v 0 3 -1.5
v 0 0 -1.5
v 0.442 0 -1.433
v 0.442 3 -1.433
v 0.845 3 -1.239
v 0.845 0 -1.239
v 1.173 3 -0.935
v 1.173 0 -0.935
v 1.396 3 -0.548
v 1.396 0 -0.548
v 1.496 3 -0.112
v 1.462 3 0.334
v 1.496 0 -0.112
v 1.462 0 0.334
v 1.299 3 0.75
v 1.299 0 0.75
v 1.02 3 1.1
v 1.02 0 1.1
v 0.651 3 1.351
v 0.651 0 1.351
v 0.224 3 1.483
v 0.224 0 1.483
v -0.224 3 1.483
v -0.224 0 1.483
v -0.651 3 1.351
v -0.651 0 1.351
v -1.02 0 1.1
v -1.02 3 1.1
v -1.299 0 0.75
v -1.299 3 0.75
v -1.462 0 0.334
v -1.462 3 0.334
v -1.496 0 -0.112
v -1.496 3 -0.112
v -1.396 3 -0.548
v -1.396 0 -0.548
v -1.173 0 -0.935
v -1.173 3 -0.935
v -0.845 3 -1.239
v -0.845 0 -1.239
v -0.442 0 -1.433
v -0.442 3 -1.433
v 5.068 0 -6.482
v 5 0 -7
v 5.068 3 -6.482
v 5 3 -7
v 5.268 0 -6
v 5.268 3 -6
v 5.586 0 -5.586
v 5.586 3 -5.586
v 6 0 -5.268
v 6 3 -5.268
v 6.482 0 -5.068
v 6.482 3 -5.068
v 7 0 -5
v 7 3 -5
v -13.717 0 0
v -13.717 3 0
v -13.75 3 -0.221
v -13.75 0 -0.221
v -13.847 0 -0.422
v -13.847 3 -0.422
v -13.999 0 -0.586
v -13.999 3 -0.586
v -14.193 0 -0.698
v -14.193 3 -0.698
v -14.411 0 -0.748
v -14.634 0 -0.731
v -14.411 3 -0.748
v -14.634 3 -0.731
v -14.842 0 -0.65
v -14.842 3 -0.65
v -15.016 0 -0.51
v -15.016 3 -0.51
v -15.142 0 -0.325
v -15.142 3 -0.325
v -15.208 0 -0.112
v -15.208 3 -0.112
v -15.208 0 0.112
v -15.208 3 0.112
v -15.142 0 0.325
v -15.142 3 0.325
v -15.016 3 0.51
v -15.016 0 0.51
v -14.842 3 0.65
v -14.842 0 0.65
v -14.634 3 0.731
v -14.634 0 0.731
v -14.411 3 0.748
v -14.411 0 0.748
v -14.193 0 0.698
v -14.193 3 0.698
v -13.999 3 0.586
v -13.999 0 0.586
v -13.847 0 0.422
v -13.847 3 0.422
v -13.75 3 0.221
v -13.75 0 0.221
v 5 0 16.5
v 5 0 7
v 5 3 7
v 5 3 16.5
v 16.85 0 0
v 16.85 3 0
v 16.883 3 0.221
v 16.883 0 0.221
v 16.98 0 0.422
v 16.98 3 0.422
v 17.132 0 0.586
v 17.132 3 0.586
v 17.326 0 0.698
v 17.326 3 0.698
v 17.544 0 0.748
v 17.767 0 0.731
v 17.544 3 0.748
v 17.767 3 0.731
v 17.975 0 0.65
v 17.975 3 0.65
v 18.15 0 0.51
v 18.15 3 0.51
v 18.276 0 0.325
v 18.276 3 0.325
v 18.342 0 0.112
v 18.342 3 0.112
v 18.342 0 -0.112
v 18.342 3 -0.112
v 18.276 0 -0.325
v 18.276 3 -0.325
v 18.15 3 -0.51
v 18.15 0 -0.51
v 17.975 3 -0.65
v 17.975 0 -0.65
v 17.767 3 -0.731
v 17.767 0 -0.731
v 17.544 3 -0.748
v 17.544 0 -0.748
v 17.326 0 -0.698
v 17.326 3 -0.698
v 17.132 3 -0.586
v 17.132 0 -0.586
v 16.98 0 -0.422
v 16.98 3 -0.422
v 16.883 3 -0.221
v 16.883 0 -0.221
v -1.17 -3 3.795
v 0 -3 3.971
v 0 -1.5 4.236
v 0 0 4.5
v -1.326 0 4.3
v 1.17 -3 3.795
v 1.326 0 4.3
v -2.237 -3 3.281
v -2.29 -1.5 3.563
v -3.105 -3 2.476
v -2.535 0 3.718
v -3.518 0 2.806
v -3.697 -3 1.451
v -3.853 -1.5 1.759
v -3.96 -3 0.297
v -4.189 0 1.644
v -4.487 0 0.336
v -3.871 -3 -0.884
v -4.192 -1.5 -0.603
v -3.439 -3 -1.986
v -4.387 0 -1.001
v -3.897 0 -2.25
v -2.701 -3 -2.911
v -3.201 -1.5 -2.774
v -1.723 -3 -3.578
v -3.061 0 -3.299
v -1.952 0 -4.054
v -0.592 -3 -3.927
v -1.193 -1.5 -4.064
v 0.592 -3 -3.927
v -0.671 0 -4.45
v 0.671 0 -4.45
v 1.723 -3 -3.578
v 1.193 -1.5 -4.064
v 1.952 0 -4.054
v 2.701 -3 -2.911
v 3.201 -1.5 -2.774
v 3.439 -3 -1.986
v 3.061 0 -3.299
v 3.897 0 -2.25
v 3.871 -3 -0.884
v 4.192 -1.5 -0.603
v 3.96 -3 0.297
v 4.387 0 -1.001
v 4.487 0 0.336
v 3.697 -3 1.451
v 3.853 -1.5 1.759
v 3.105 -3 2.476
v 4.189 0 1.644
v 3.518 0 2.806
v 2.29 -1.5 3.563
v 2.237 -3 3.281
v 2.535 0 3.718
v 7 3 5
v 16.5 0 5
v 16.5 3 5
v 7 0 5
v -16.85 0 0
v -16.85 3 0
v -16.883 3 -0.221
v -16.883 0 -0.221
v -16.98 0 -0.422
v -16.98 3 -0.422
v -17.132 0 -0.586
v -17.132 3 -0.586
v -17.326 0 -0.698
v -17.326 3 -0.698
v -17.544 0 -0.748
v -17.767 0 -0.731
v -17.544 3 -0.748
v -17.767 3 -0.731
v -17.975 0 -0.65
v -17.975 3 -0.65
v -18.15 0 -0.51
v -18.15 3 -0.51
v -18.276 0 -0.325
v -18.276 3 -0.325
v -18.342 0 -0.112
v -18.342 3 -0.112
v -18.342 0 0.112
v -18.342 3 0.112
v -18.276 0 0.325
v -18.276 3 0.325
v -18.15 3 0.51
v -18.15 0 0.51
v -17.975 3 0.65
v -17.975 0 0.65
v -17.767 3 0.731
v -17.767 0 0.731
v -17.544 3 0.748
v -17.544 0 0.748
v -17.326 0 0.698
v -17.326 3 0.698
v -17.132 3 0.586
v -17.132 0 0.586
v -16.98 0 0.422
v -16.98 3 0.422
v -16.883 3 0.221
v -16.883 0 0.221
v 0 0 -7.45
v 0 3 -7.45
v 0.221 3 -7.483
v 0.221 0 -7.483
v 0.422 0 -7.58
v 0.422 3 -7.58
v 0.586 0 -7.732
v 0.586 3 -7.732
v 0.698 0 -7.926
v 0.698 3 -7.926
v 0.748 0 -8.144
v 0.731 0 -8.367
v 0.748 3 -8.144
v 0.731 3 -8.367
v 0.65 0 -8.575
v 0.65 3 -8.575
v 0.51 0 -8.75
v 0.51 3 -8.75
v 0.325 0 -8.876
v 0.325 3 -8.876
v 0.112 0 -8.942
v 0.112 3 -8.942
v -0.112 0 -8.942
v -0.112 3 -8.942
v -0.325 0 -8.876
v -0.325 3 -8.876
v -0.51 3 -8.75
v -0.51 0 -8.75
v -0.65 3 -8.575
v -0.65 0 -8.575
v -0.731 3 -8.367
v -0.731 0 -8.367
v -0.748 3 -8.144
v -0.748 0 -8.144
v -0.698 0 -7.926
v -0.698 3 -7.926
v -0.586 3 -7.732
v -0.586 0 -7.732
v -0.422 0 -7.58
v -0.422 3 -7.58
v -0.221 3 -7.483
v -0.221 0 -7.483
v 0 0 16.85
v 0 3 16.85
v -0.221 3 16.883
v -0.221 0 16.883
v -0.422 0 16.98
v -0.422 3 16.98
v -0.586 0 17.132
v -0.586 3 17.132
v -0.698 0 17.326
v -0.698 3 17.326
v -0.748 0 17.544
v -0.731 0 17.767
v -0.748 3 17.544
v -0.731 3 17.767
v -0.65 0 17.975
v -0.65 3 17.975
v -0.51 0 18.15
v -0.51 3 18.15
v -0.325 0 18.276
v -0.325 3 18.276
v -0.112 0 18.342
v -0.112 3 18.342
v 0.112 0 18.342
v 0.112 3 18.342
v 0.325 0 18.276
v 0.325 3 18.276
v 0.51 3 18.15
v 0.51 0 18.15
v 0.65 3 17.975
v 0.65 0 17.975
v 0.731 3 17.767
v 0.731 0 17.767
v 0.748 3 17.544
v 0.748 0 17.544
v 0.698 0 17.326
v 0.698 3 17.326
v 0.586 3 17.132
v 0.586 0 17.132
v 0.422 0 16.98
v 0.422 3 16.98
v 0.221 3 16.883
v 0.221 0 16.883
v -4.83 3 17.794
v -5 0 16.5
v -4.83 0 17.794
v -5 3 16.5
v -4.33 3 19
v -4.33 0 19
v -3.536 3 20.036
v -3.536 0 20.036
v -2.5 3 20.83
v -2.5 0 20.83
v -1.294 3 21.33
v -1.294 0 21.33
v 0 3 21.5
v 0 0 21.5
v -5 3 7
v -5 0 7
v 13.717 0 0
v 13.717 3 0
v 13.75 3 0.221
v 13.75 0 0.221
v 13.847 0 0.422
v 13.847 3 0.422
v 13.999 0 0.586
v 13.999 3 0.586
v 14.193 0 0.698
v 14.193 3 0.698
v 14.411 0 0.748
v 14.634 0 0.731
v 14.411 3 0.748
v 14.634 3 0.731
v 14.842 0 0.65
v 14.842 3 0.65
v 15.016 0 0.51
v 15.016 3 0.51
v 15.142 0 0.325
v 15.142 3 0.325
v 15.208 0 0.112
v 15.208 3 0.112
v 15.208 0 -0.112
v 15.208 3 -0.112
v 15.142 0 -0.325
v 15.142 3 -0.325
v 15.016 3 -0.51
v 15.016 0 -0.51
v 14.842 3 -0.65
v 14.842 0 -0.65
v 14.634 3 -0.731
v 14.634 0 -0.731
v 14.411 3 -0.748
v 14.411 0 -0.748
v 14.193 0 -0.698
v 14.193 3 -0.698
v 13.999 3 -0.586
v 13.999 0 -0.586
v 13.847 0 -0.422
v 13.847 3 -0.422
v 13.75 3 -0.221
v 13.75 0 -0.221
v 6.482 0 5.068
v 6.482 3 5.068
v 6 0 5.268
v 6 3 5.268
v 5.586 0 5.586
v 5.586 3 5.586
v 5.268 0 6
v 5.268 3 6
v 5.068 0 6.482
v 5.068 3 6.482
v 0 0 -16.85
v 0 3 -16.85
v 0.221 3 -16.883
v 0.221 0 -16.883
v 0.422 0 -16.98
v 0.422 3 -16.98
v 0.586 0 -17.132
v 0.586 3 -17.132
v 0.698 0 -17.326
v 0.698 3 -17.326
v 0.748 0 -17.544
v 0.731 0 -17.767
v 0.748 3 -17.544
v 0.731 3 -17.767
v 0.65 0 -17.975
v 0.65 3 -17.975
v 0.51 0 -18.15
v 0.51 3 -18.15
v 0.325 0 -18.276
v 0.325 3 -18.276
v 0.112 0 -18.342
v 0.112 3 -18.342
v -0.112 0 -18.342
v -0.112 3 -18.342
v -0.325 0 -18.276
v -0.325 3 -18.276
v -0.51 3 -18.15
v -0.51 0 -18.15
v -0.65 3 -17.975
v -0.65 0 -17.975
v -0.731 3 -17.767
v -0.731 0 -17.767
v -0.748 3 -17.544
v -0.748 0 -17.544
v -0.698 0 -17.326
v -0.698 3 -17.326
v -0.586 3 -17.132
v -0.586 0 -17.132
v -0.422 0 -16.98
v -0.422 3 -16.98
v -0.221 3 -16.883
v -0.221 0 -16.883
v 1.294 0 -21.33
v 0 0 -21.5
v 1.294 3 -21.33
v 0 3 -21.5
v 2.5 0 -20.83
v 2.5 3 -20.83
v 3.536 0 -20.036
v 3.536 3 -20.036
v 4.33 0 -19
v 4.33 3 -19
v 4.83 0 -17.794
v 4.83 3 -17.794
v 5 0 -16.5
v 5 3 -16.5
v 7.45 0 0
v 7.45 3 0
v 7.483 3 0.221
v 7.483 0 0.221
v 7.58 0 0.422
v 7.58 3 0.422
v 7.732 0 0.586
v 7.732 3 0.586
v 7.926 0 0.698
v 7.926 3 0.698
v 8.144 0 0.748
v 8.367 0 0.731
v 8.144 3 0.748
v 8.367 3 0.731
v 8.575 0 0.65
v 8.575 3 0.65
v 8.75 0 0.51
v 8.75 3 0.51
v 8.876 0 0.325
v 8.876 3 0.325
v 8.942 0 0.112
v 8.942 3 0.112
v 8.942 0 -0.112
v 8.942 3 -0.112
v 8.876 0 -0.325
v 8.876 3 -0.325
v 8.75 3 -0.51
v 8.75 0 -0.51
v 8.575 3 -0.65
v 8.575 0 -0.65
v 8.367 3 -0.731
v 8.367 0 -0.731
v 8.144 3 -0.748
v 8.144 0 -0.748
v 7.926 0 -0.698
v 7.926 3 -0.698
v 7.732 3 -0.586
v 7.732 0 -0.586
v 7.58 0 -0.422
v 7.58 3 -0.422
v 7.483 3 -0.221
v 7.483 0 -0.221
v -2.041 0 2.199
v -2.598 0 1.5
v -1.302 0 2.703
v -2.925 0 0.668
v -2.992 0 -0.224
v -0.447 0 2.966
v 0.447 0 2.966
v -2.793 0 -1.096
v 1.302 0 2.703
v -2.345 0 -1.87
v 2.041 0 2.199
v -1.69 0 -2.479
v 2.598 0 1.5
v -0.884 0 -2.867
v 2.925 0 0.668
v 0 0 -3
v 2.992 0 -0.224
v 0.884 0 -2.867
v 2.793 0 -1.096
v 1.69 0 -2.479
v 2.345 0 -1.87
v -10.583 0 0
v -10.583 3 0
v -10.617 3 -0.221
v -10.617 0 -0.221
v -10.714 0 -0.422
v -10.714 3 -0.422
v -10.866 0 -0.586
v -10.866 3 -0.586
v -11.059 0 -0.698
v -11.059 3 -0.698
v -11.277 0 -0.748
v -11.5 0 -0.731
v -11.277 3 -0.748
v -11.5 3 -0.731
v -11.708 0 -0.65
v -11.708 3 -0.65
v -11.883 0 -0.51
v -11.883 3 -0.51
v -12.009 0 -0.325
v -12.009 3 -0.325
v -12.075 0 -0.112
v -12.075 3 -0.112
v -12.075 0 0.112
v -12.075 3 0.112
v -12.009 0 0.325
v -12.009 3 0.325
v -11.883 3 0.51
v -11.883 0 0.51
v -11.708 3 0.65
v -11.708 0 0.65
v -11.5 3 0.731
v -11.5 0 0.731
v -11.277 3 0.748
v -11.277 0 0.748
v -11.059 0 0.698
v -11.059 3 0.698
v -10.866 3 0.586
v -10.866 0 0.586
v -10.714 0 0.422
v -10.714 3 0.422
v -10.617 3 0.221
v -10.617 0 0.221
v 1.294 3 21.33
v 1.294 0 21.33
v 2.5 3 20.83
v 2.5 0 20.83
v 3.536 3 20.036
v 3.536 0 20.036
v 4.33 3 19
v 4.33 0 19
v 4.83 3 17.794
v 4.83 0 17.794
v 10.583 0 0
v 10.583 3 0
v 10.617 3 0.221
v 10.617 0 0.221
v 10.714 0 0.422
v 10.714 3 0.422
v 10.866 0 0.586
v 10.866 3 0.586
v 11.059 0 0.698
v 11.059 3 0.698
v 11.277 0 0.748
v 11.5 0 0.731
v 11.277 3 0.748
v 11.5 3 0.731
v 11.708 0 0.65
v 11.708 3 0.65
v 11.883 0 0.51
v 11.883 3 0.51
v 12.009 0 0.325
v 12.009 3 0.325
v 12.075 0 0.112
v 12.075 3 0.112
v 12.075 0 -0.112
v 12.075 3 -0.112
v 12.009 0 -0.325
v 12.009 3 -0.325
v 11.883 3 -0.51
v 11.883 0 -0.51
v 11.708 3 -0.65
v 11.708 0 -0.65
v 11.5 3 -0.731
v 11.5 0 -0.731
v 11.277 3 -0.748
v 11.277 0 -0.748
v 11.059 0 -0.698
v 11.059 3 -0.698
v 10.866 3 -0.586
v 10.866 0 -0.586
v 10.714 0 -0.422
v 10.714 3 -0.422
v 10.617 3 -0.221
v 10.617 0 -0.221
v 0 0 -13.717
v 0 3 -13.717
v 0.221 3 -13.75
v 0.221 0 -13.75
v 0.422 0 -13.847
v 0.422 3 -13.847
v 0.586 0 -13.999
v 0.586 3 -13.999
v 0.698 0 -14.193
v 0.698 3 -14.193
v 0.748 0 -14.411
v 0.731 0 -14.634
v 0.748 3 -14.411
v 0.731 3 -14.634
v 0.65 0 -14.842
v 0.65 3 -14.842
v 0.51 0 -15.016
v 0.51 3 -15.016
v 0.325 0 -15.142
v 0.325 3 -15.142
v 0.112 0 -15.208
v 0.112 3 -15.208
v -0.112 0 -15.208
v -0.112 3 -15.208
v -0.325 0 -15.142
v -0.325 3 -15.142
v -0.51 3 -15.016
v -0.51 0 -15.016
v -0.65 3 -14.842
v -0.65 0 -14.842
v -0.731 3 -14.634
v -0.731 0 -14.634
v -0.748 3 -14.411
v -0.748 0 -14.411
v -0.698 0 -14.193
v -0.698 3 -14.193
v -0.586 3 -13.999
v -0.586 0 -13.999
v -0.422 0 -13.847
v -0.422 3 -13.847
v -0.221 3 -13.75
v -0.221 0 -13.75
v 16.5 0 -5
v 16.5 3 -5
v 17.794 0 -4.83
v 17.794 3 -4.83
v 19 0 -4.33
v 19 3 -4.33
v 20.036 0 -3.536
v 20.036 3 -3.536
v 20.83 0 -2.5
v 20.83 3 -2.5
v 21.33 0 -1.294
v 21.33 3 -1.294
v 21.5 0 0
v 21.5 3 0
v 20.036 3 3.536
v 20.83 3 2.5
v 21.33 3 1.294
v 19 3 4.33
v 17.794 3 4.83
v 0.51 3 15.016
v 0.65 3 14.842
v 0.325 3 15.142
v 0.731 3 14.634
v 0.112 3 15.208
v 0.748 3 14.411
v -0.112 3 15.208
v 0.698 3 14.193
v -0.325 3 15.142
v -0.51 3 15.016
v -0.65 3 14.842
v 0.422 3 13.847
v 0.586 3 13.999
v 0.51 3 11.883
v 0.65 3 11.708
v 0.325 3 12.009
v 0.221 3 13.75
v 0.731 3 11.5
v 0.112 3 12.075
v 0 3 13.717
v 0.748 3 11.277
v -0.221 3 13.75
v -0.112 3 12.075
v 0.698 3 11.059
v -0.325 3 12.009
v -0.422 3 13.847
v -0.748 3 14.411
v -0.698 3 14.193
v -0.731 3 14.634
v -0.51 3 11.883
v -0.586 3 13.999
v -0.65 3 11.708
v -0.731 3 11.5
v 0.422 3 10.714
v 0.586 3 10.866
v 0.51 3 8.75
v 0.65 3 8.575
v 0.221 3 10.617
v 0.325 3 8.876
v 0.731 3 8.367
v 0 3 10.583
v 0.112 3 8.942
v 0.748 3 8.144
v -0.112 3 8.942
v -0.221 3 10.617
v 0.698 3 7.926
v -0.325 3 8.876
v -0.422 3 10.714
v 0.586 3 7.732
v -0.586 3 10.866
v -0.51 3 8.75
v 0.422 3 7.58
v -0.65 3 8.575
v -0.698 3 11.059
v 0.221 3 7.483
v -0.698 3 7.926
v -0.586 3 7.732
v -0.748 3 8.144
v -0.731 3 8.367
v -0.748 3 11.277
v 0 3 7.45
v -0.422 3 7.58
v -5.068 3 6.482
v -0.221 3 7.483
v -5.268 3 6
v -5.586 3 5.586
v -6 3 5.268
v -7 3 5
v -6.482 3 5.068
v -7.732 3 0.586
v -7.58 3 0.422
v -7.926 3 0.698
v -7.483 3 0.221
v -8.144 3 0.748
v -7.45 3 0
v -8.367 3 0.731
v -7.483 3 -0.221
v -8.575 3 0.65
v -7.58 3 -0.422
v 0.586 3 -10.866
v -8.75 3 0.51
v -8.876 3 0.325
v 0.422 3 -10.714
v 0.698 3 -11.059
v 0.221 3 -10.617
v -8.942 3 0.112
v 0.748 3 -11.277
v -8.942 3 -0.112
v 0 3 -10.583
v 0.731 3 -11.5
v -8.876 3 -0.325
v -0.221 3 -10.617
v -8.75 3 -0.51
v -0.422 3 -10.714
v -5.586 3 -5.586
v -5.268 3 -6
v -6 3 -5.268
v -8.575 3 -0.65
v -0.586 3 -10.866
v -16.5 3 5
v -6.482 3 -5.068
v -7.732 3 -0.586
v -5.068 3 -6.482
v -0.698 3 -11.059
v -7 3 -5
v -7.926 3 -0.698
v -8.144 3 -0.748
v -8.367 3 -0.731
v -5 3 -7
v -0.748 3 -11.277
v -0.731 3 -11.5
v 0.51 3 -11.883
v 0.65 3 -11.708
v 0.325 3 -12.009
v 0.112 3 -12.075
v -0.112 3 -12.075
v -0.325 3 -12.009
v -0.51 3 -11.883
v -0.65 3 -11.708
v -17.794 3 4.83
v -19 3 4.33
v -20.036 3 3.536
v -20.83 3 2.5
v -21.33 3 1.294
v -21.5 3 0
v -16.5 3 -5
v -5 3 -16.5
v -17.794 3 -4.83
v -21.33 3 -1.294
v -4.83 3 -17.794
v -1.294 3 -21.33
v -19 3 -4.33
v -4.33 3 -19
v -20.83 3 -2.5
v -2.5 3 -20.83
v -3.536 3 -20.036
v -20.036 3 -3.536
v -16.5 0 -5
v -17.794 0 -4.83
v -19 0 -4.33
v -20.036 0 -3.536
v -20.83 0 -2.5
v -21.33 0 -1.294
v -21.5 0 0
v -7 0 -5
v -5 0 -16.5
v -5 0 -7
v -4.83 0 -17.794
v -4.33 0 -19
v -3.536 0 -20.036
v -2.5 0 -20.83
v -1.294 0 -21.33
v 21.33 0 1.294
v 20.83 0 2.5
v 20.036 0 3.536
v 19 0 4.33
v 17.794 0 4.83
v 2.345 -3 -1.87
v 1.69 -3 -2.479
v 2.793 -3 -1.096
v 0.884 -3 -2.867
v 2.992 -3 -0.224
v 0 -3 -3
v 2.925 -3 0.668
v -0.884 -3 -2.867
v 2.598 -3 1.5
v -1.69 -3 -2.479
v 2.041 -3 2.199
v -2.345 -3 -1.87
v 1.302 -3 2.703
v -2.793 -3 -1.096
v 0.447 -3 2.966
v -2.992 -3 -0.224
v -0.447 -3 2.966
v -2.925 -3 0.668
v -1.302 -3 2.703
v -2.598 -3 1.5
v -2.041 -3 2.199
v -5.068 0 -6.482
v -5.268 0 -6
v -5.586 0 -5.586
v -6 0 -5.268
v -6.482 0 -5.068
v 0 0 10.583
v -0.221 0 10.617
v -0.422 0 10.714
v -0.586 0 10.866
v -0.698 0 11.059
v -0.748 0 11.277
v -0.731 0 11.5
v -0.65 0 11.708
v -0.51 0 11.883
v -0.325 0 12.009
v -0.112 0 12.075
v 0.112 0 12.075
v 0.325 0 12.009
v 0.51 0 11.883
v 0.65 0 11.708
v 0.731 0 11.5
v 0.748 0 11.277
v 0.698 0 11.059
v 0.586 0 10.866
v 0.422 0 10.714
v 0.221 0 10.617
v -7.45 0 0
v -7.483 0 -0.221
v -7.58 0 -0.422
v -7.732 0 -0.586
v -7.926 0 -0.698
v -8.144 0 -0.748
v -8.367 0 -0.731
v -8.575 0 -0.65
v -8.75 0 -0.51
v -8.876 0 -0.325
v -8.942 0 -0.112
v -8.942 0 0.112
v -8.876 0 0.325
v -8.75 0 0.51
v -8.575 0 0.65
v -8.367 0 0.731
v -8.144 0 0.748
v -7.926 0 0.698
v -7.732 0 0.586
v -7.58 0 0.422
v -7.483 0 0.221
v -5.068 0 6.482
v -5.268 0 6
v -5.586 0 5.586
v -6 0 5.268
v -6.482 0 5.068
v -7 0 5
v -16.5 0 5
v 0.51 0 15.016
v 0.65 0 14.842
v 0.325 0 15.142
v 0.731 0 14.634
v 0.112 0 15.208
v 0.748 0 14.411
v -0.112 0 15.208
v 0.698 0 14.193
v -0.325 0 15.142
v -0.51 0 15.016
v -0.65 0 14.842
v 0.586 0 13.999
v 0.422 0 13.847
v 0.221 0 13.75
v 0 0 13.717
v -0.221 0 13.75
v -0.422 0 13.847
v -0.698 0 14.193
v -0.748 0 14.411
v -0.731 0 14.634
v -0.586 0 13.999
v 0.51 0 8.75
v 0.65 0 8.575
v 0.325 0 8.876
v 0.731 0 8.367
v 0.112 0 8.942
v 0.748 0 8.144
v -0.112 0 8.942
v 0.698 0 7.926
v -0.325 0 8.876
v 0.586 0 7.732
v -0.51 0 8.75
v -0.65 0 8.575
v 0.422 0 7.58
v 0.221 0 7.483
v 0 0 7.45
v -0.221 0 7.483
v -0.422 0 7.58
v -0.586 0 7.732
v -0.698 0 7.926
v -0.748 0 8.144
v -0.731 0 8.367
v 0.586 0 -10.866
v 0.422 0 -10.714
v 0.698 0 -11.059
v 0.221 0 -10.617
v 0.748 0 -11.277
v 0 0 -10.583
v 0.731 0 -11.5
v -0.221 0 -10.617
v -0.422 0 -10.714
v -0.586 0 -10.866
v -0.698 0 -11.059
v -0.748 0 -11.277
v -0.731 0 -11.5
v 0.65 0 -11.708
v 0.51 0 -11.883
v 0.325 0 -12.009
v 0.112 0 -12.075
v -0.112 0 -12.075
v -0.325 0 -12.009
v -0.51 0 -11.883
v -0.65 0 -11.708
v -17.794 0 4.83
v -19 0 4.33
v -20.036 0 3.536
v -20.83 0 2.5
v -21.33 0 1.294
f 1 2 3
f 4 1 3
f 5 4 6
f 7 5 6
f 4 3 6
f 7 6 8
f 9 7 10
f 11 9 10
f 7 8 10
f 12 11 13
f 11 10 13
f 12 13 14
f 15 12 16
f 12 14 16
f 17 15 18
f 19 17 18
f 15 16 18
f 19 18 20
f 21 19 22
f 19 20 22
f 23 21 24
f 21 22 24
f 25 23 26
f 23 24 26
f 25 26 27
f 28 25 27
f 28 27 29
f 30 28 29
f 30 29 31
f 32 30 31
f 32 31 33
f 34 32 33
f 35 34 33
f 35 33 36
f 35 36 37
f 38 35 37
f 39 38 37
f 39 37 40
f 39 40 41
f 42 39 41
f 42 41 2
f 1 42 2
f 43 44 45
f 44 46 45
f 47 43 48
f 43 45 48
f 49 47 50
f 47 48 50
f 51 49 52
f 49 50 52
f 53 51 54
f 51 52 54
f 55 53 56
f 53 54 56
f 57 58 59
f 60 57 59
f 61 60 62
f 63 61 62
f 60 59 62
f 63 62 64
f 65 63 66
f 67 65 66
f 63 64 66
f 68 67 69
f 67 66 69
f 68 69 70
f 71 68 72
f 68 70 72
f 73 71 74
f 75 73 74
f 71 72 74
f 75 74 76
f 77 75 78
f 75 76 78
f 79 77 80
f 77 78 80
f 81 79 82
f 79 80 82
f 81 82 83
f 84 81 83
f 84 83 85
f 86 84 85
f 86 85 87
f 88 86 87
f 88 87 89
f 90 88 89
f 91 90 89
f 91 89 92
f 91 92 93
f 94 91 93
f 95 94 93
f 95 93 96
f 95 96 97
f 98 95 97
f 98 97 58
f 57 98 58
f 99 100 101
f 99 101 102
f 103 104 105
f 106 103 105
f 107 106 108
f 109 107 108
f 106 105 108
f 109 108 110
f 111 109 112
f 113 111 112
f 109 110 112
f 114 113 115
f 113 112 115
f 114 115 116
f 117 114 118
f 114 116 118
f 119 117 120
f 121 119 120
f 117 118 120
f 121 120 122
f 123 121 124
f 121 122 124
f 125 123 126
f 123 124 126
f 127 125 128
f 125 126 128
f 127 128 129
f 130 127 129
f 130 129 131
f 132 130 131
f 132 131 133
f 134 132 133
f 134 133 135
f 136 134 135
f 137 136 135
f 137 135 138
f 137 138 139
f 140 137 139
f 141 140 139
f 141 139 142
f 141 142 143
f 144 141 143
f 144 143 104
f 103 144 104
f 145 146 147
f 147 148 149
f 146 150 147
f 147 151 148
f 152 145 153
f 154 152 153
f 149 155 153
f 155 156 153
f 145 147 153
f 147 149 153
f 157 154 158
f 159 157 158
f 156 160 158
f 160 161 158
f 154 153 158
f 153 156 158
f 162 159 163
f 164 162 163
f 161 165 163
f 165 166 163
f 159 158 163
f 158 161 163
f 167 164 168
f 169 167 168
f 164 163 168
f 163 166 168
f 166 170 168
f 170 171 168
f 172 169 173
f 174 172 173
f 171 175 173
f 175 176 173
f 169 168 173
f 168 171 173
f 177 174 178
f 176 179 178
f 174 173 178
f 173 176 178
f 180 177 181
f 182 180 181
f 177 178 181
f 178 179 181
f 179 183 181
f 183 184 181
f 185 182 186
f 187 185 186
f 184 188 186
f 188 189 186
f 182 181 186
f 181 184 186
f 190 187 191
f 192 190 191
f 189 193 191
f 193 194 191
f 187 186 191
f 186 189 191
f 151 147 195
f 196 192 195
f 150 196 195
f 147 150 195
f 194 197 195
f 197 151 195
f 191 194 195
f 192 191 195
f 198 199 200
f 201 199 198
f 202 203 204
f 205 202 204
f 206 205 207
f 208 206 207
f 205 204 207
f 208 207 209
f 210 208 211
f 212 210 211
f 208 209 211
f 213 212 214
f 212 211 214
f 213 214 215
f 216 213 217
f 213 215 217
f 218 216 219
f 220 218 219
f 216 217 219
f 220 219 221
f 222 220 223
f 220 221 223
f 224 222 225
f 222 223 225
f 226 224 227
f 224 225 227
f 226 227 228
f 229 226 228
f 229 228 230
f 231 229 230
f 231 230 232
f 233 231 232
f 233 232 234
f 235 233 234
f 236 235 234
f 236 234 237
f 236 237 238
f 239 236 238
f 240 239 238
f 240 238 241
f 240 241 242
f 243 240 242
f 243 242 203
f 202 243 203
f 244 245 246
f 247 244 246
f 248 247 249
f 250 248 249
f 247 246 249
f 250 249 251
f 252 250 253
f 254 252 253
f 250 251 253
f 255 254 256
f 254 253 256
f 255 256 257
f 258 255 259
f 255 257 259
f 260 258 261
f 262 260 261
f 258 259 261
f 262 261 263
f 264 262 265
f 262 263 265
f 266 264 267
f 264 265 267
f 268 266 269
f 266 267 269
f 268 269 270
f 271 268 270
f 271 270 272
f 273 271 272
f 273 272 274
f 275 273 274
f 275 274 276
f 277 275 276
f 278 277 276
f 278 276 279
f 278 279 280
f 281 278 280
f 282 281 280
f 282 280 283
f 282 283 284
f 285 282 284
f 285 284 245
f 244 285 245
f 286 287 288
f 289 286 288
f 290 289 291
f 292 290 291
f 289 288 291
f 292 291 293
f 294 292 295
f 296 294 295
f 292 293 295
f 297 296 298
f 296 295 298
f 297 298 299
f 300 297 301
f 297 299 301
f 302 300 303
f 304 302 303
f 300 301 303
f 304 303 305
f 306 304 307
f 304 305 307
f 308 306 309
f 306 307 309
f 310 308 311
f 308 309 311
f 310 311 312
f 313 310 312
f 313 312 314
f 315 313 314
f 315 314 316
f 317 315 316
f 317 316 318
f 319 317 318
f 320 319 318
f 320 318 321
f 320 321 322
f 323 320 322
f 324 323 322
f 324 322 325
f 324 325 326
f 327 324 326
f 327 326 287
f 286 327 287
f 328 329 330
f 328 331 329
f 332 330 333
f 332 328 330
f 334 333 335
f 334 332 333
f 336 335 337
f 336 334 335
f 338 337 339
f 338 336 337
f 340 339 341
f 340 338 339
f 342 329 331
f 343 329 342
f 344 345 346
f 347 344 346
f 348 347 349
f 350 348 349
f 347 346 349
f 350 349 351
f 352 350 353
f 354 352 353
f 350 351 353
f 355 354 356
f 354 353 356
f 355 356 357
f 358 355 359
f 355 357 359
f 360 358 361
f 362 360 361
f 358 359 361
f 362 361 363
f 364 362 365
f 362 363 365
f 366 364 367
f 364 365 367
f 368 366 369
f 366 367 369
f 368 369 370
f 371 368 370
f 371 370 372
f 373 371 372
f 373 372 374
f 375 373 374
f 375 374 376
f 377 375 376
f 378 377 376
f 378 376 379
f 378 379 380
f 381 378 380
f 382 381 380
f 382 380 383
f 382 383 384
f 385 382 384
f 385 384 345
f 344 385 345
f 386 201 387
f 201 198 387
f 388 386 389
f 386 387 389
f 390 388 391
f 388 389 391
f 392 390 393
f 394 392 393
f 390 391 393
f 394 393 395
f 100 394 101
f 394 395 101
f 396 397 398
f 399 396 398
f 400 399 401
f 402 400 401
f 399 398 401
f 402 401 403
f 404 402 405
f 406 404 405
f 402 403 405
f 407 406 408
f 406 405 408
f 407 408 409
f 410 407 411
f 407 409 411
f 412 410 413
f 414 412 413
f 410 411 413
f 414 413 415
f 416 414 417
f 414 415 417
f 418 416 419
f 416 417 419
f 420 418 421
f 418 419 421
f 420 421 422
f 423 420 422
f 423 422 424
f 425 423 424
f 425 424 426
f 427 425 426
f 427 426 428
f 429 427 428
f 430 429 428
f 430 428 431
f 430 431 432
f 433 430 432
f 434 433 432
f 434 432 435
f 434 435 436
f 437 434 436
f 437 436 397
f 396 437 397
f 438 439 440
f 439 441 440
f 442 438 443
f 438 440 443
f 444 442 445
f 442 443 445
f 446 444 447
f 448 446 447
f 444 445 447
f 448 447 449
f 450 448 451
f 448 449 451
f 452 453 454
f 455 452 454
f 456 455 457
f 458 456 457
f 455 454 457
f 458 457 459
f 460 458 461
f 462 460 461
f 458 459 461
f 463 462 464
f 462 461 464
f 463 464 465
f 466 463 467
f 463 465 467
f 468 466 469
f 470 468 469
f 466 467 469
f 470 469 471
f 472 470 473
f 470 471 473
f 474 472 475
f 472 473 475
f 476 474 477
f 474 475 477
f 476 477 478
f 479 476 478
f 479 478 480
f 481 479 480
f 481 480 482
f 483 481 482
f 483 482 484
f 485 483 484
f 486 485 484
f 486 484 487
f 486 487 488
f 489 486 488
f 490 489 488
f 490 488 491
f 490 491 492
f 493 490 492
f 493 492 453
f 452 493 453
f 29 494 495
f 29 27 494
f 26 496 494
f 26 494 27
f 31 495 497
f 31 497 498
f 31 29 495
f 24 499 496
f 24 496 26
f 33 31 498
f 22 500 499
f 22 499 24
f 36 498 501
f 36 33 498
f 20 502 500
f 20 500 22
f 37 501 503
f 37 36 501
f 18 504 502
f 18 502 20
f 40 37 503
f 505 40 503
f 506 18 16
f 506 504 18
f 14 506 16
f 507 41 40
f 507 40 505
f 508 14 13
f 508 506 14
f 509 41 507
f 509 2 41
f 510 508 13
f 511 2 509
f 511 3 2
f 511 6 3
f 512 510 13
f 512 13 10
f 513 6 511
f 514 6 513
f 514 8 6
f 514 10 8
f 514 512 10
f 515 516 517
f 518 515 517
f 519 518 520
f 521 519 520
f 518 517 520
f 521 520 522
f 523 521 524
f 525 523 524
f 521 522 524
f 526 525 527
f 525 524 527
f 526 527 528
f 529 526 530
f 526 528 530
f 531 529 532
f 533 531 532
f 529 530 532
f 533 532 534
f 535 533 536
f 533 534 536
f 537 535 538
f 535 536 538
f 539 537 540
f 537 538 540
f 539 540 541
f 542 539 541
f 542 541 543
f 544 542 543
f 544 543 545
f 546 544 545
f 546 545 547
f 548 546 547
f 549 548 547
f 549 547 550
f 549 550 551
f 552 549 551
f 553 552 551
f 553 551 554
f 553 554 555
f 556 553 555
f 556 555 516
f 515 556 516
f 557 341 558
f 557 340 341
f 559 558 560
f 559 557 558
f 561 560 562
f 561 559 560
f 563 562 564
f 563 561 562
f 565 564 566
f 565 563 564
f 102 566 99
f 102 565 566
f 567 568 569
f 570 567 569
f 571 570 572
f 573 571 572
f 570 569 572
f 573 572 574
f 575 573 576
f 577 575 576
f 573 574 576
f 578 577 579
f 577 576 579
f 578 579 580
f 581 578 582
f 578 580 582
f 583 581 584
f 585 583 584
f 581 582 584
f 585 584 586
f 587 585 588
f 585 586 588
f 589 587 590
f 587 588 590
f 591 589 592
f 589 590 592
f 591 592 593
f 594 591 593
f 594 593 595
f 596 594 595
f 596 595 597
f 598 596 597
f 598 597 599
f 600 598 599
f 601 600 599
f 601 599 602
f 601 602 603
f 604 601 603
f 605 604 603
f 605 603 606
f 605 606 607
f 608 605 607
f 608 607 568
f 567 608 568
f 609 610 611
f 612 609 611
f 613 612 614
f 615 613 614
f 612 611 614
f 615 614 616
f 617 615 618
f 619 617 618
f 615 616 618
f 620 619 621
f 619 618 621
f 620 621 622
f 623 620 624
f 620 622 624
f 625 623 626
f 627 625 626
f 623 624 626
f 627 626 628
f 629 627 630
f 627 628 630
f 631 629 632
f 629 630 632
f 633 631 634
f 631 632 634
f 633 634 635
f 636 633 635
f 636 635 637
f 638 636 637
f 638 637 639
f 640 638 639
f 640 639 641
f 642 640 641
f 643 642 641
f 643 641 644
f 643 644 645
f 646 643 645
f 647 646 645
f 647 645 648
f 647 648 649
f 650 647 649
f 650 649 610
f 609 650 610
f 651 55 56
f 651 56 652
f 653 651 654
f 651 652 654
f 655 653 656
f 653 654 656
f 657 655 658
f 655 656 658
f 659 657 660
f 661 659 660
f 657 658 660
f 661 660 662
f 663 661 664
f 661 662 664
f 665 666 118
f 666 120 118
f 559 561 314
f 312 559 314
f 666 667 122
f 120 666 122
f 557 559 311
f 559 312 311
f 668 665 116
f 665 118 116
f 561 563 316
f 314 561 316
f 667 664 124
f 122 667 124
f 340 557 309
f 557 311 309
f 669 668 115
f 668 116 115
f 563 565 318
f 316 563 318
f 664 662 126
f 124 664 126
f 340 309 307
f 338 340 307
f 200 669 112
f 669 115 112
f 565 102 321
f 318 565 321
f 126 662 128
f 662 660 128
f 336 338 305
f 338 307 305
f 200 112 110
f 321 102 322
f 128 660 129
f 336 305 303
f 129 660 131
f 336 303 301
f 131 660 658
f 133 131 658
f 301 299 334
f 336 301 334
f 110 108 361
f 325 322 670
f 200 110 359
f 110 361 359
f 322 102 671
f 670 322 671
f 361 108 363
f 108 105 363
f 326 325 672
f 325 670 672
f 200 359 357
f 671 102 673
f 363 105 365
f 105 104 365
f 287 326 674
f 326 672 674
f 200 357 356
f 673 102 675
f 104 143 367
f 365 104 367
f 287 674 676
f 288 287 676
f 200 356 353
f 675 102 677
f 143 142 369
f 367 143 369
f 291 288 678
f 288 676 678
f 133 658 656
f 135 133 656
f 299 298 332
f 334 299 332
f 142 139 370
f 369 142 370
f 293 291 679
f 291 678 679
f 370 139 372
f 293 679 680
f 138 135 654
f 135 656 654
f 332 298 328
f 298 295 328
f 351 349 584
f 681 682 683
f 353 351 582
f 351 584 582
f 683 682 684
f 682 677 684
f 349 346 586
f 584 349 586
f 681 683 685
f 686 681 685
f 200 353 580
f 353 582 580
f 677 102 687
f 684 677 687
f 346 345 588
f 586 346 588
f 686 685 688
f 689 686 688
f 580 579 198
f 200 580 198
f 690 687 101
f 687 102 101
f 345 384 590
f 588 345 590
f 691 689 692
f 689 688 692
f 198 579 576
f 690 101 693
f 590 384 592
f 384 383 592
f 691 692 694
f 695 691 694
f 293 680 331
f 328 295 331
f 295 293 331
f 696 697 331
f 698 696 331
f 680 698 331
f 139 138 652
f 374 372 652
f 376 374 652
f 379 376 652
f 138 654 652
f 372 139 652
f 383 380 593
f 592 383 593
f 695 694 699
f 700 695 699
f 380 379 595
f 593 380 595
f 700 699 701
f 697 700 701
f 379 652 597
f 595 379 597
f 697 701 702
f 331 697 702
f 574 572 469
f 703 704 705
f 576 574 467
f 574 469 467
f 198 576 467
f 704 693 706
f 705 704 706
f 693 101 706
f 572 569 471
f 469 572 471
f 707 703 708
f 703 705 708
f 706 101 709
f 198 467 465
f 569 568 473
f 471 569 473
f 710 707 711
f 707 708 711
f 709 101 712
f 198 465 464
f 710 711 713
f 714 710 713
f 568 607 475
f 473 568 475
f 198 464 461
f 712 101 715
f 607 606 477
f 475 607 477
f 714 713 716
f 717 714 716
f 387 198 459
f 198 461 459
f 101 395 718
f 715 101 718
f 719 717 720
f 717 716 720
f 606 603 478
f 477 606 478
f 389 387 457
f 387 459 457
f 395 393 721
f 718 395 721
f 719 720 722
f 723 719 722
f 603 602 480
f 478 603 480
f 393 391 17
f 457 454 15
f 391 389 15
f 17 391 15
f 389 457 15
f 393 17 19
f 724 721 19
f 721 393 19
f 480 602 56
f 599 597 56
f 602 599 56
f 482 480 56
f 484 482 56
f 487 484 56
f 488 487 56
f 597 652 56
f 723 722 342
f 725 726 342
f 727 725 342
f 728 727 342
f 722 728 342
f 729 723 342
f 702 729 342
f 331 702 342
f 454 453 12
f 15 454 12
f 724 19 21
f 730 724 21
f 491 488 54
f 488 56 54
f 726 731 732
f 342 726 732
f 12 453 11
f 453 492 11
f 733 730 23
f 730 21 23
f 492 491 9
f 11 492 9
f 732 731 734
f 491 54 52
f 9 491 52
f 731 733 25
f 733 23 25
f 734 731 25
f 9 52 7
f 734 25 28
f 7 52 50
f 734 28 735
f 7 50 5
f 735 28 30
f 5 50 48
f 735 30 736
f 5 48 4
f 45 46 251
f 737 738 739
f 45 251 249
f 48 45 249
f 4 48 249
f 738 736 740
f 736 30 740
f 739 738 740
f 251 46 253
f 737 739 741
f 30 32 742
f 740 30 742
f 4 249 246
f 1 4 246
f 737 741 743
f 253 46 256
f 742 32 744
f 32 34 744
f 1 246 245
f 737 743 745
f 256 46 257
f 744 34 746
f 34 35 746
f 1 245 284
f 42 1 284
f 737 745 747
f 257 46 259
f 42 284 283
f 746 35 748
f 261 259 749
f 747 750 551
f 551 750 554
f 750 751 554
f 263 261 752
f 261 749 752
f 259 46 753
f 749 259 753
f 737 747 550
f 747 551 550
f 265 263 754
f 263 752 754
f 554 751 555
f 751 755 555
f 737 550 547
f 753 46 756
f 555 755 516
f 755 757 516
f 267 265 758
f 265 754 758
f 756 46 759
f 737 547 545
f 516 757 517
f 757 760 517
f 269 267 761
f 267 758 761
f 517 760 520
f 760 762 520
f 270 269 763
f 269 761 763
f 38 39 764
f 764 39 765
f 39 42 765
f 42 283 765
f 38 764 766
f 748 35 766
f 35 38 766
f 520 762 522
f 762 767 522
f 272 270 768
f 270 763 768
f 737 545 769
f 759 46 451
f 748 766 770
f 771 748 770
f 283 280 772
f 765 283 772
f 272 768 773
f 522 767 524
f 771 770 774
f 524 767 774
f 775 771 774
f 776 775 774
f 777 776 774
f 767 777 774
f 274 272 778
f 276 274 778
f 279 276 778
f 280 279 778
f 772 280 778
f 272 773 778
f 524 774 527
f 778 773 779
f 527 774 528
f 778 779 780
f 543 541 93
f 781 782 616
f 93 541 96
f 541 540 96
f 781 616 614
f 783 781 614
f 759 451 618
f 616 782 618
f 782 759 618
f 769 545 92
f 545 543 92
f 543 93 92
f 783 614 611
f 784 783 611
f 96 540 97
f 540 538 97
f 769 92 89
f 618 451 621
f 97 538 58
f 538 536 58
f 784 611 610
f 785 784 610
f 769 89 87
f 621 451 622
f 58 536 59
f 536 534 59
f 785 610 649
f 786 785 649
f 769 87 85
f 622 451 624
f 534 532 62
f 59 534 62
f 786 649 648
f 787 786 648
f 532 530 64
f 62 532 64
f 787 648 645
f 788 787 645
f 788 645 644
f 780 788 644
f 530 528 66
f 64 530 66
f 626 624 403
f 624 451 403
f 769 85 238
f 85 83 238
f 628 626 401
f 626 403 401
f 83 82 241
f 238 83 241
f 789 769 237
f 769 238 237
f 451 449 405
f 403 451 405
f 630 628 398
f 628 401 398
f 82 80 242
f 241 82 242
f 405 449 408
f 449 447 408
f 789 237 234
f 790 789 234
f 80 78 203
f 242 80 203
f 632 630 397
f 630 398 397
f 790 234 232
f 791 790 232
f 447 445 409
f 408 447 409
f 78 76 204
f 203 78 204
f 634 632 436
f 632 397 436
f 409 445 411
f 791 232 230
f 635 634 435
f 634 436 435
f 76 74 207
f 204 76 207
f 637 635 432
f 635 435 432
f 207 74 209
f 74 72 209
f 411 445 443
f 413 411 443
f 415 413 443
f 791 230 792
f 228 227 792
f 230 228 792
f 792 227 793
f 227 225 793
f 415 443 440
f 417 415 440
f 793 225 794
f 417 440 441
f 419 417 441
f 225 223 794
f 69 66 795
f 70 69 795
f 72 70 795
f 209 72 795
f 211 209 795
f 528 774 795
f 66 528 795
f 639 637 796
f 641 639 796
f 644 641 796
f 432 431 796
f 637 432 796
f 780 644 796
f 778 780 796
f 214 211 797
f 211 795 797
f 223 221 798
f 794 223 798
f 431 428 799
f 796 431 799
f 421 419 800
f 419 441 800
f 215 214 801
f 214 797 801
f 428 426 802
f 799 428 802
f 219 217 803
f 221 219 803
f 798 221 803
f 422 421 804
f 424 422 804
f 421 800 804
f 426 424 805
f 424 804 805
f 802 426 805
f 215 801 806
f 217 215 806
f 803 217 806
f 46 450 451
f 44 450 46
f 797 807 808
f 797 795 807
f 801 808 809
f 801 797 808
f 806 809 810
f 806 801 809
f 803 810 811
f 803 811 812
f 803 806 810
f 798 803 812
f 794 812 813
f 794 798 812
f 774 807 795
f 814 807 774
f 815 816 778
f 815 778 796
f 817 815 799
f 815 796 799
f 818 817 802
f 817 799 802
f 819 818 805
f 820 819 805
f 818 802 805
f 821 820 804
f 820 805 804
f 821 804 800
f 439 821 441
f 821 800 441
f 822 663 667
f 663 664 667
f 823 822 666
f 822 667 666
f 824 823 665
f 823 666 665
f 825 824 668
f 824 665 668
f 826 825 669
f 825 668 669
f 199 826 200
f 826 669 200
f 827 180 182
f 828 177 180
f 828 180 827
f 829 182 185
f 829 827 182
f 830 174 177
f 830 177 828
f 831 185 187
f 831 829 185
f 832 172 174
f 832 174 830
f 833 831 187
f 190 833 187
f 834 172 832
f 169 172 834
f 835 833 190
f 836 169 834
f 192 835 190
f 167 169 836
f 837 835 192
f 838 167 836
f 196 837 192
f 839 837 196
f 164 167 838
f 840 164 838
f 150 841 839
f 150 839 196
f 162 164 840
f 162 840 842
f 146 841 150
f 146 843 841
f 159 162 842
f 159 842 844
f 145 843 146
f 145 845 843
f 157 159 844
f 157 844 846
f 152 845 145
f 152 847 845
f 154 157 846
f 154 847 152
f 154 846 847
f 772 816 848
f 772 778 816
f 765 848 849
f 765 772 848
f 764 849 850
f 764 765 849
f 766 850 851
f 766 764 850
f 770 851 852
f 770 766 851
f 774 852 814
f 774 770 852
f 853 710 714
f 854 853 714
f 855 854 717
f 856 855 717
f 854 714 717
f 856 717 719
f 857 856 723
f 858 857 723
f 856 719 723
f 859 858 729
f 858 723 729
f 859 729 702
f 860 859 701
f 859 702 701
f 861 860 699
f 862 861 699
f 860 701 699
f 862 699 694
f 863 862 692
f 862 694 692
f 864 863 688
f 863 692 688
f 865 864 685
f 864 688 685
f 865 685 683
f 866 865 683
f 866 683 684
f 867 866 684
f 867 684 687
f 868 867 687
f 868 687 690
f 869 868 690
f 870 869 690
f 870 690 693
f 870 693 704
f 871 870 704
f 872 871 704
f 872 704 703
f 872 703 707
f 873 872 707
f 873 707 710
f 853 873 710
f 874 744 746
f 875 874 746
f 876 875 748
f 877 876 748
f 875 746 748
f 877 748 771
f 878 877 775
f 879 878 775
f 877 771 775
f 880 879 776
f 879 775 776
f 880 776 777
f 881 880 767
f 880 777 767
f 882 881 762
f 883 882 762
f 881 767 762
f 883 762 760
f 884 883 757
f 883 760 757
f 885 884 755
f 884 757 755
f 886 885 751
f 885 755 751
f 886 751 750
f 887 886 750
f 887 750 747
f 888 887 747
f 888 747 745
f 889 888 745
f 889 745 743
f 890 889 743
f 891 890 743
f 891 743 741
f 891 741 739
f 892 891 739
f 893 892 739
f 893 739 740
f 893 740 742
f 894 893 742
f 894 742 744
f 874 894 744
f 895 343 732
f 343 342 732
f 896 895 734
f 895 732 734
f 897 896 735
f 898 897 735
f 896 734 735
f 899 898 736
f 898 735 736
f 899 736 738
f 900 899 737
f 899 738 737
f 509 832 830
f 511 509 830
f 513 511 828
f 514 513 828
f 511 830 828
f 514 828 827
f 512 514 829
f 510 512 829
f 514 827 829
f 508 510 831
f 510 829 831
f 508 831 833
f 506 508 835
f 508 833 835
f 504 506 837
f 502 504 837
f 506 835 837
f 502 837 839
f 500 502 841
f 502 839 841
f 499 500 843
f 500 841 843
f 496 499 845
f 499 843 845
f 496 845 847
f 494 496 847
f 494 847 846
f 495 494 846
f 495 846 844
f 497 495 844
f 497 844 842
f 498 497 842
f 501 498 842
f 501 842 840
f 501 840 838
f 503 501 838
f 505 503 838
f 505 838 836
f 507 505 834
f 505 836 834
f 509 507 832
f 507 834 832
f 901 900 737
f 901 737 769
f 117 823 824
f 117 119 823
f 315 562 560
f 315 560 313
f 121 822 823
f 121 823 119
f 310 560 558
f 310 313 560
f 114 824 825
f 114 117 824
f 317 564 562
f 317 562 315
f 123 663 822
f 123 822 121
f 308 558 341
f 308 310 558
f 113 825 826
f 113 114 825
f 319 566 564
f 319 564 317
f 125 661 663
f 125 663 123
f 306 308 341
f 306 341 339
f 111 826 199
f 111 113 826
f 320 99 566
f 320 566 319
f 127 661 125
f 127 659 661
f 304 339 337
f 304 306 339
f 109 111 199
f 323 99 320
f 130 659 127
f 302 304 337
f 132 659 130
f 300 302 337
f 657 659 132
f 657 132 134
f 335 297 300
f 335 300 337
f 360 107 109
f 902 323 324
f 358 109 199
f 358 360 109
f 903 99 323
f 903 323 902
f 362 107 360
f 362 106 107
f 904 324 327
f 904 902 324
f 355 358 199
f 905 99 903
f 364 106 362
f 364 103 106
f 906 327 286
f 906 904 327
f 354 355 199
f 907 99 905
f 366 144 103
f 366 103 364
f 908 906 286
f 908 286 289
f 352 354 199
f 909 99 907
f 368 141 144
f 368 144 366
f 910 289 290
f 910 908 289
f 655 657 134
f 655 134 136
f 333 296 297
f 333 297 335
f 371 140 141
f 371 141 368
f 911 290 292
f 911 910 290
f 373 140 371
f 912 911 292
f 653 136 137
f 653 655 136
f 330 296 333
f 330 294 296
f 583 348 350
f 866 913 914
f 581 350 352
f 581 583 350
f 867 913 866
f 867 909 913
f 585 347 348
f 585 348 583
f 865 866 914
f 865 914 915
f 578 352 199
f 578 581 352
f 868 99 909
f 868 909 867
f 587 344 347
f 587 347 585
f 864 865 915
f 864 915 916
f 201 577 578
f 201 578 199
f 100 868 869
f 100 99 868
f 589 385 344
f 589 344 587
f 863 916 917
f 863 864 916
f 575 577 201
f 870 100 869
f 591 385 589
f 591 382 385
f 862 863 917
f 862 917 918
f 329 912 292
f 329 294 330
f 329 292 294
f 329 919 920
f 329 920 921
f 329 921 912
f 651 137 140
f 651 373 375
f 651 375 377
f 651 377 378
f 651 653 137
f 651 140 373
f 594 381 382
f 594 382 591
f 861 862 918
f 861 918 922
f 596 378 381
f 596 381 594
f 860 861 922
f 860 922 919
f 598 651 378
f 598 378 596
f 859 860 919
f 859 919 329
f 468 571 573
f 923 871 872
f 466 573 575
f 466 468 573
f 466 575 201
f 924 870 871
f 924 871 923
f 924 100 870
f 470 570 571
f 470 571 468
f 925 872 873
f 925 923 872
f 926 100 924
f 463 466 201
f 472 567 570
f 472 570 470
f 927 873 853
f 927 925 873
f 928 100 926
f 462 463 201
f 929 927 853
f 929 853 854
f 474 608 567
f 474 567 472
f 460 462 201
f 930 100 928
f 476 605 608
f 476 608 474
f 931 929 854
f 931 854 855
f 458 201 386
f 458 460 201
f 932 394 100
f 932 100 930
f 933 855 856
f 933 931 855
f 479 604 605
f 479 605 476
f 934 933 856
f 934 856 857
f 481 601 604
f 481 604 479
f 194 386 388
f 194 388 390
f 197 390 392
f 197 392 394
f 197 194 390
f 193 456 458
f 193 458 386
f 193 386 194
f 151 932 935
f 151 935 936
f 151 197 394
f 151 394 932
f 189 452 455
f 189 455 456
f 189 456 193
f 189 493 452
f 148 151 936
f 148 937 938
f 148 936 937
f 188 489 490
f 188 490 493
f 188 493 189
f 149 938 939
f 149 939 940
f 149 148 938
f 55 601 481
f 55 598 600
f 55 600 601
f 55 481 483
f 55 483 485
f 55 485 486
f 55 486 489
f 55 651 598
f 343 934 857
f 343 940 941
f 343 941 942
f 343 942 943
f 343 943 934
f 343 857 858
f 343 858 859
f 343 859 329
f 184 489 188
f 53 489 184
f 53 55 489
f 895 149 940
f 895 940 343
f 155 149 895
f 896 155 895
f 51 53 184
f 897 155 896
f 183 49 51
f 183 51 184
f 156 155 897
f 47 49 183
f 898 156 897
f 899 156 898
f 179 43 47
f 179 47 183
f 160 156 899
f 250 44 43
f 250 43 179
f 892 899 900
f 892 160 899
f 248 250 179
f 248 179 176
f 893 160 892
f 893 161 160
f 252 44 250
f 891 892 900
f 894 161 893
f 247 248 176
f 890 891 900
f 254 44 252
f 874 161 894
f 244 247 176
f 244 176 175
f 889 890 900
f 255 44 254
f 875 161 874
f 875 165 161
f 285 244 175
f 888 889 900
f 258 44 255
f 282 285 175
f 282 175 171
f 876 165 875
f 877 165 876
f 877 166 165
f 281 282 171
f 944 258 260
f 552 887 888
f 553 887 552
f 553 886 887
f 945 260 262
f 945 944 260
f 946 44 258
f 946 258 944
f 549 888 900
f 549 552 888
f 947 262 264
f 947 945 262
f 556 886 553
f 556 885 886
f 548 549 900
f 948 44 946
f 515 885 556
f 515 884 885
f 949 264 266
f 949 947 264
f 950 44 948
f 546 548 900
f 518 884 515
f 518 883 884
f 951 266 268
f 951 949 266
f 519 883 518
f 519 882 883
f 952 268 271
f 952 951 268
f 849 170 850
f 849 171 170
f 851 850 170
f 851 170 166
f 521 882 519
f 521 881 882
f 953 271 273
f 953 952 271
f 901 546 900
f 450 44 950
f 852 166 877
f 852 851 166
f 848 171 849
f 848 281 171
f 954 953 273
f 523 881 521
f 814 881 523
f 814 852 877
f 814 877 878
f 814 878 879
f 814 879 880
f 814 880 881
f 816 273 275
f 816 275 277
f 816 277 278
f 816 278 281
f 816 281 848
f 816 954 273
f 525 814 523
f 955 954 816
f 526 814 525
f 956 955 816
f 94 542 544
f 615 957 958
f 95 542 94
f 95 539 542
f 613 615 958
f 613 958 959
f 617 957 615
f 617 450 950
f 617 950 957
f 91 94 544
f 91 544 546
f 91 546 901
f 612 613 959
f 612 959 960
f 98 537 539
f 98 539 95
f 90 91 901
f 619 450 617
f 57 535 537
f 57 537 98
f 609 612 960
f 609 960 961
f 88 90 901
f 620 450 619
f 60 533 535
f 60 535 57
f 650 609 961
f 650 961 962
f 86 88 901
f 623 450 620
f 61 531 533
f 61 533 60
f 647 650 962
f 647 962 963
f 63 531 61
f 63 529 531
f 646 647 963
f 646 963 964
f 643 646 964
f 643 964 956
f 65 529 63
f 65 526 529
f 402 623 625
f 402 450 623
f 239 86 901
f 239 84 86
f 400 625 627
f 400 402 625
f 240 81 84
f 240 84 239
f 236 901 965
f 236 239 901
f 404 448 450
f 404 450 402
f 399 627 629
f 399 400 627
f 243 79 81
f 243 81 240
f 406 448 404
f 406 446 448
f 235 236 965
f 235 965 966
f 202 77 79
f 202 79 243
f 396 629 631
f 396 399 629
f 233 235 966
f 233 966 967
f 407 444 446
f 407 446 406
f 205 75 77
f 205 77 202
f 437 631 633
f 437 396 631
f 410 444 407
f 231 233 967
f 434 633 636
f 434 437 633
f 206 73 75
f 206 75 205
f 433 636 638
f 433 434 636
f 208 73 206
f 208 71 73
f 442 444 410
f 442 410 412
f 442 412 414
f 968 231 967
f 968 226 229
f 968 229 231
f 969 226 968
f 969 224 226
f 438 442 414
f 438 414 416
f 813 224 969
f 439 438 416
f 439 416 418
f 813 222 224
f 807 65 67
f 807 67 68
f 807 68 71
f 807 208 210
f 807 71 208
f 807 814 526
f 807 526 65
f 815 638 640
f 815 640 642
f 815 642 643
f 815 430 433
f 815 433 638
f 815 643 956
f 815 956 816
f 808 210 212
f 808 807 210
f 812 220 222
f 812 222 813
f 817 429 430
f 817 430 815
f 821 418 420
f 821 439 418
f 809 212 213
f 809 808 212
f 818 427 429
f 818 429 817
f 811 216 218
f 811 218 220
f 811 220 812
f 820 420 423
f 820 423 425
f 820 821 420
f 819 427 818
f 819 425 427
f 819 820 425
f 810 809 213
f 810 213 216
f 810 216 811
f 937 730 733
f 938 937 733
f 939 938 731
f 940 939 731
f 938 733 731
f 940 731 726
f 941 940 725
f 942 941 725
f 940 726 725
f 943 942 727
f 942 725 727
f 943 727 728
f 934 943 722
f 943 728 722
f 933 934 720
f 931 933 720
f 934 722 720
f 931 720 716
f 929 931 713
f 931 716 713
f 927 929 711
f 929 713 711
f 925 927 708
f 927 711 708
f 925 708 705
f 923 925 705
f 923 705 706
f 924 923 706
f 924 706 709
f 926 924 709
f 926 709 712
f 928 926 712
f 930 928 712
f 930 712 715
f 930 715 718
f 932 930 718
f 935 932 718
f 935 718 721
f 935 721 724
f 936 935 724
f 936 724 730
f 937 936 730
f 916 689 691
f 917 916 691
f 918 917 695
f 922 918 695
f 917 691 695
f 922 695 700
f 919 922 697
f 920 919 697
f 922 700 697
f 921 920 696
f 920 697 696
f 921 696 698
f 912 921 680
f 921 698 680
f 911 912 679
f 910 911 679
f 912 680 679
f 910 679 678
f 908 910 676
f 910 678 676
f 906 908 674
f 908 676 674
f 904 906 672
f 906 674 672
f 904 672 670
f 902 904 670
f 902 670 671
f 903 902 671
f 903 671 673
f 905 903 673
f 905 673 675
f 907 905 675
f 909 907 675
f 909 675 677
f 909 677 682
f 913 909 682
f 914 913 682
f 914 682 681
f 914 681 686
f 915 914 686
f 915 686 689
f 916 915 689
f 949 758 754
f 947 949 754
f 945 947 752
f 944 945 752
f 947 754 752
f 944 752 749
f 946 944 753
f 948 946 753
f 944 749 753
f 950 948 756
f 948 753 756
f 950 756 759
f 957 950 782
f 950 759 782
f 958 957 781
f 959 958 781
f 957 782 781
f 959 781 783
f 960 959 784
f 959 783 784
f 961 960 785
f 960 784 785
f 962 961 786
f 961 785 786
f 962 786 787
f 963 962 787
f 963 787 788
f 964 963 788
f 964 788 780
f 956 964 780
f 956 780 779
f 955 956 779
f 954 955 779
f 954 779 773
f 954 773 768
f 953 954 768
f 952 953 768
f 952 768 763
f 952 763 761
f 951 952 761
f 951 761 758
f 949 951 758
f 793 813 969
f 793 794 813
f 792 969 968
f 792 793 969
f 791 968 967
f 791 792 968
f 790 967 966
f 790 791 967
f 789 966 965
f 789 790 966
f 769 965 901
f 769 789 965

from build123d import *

# Parameters (mm, degrees)
BOSS_EXTRUDE1_DEPTH = 3
FILLET1_R           = 2
FILLET2_R           = 5
SKETCH2_R           = 4.5
BOSS_EXTRUDE2_DEPTH = 3
DRAFT1_ANGLE        = 10
SKETCH3_R           = 3
CUT_EXTRUDE1_DEPTH  = 3
SKETCH4_R           = 1.5
CUT_EXTRUDE2_DEPTH  = 31.553232235
SKETCH5_R           = 0.75
CUT_EXTRUDE3_DEPTH  = 31.991934435
CIRPATTERN1_COUNT   = 4


with BuildPart() as part:
    # Sketch1 → Boss-Extrude1 (new body)
    with BuildSketch(Plane(origin=(0, 0, 0), x_dir=(1, 0, 0), z_dir=(0, 1, 0))):
        Polygon((-5, 5), (-5, 21.5), (5, 21.5), (5, 5), (21.5, 5), (21.5, -5), (5, -5), (5, -21.5), (-5, -21.5), (-5, -5), (-21.5, -5), (-21.5, 5), align=None)
    extrude(amount=BOSS_EXTRUDE1_DEPTH)

    # Fillet1
    fillet1_edges = [part.edges().sort_by_distance(p)[0] for p in [
        (-5, 1.5, -5),
        (5, 1.5, -5),
        (5, 1.5, 5),
        (-5, 1.5, 5),
    ]]
    fillet(fillet1_edges, radius=FILLET1_R)

    # Fillet2
    fillet2_edges = [part.edges().sort_by_distance(p)[0] for p in [
        (-21.5, 1.5, -5),
        (-5, 1.5, -21.5),
        (-21.5, 1.5, 5),
        (5, 1.5, -21.5),
        (21.5, 1.5, -5),
        (21.5, 1.5, 5),
        (5, 1.5, 21.5),
        (-5, 1.5, 21.5),
    ]]
    fillet(fillet2_edges, radius=FILLET2_R - 0.0001)  # a hair under: the kernel refuses the full size

    # Sketch2 → Boss-Extrude2 (add)
    with BuildSketch(Plane.XZ):
        with Locations(Location((0, 0, 0), (0, 0, 90))):
            Circle(SKETCH2_R)
    extrude(amount=BOSS_EXTRUDE2_DEPTH)

    # Draft1
    draft1_faces = [part.faces().sort_by_distance(p)[0] for p in [
        (0, -1.5, -4.5),
    ]]
    draft(draft1_faces, Plane(origin=(0, 0, 0), x_dir=(0, 0, -1), z_dir=(0, -1, 0)), DRAFT1_ANGLE)

    # Sketch3 → Cut-Extrude1 (cut)
    with BuildSketch(Plane.XZ.offset(3)):
        with Locations(Location((0, 0, 0), (0, 0, 270))):
            Circle(SKETCH3_R)
    extrude(amount=-CUT_EXTRUDE1_DEPTH, mode=Mode.SUBTRACT)

    # Sketch4 → Cut-Extrude2 (cut, through all)
    with BuildSketch(Plane.XZ):
        with Locations(Location((0, 0, 0), (0, 0, 270))):
            Circle(SKETCH4_R)
    extrude(amount=-CUT_EXTRUDE2_DEPTH, mode=Mode.SUBTRACT)

    # Sketch5 → Cut-Extrude3 (cut, through all)
    with BuildSketch(Plane(origin=(0, 3, 0), x_dir=(1, 0, 0), z_dir=(0, 1, 0))):
        with Locations(Location((0, 17.6, 0), (0, 0, 270))):
            Circle(SKETCH5_R)
        with Locations(Location((0, 14.466666667, 0), (0, 0, 270))):
            Circle(SKETCH5_R)
        with Locations(Location((0, 11.333333333, 0), (0, 0, 270))):
            Circle(SKETCH5_R)
        with Locations(Location((0, 8.2, 0), (0, 0, 270))):
            Circle(SKETCH5_R)
    cut_extrude3 = extrude(amount=-CUT_EXTRUDE3_DEPTH, mode=Mode.SUBTRACT)

    # CirPattern1: Cut-Extrude3 ×4 about axis
    cirpattern1_axis = Axis((0, 0, 0), (0, 1, 0))
    for i in range(1, CIRPATTERN1_COUNT):
        add(cut_extrude3.rotate(cirpattern1_axis, i * 360 / CIRPATTERN1_COUNT), mode=Mode.SUBTRACT)


solid = part.part
